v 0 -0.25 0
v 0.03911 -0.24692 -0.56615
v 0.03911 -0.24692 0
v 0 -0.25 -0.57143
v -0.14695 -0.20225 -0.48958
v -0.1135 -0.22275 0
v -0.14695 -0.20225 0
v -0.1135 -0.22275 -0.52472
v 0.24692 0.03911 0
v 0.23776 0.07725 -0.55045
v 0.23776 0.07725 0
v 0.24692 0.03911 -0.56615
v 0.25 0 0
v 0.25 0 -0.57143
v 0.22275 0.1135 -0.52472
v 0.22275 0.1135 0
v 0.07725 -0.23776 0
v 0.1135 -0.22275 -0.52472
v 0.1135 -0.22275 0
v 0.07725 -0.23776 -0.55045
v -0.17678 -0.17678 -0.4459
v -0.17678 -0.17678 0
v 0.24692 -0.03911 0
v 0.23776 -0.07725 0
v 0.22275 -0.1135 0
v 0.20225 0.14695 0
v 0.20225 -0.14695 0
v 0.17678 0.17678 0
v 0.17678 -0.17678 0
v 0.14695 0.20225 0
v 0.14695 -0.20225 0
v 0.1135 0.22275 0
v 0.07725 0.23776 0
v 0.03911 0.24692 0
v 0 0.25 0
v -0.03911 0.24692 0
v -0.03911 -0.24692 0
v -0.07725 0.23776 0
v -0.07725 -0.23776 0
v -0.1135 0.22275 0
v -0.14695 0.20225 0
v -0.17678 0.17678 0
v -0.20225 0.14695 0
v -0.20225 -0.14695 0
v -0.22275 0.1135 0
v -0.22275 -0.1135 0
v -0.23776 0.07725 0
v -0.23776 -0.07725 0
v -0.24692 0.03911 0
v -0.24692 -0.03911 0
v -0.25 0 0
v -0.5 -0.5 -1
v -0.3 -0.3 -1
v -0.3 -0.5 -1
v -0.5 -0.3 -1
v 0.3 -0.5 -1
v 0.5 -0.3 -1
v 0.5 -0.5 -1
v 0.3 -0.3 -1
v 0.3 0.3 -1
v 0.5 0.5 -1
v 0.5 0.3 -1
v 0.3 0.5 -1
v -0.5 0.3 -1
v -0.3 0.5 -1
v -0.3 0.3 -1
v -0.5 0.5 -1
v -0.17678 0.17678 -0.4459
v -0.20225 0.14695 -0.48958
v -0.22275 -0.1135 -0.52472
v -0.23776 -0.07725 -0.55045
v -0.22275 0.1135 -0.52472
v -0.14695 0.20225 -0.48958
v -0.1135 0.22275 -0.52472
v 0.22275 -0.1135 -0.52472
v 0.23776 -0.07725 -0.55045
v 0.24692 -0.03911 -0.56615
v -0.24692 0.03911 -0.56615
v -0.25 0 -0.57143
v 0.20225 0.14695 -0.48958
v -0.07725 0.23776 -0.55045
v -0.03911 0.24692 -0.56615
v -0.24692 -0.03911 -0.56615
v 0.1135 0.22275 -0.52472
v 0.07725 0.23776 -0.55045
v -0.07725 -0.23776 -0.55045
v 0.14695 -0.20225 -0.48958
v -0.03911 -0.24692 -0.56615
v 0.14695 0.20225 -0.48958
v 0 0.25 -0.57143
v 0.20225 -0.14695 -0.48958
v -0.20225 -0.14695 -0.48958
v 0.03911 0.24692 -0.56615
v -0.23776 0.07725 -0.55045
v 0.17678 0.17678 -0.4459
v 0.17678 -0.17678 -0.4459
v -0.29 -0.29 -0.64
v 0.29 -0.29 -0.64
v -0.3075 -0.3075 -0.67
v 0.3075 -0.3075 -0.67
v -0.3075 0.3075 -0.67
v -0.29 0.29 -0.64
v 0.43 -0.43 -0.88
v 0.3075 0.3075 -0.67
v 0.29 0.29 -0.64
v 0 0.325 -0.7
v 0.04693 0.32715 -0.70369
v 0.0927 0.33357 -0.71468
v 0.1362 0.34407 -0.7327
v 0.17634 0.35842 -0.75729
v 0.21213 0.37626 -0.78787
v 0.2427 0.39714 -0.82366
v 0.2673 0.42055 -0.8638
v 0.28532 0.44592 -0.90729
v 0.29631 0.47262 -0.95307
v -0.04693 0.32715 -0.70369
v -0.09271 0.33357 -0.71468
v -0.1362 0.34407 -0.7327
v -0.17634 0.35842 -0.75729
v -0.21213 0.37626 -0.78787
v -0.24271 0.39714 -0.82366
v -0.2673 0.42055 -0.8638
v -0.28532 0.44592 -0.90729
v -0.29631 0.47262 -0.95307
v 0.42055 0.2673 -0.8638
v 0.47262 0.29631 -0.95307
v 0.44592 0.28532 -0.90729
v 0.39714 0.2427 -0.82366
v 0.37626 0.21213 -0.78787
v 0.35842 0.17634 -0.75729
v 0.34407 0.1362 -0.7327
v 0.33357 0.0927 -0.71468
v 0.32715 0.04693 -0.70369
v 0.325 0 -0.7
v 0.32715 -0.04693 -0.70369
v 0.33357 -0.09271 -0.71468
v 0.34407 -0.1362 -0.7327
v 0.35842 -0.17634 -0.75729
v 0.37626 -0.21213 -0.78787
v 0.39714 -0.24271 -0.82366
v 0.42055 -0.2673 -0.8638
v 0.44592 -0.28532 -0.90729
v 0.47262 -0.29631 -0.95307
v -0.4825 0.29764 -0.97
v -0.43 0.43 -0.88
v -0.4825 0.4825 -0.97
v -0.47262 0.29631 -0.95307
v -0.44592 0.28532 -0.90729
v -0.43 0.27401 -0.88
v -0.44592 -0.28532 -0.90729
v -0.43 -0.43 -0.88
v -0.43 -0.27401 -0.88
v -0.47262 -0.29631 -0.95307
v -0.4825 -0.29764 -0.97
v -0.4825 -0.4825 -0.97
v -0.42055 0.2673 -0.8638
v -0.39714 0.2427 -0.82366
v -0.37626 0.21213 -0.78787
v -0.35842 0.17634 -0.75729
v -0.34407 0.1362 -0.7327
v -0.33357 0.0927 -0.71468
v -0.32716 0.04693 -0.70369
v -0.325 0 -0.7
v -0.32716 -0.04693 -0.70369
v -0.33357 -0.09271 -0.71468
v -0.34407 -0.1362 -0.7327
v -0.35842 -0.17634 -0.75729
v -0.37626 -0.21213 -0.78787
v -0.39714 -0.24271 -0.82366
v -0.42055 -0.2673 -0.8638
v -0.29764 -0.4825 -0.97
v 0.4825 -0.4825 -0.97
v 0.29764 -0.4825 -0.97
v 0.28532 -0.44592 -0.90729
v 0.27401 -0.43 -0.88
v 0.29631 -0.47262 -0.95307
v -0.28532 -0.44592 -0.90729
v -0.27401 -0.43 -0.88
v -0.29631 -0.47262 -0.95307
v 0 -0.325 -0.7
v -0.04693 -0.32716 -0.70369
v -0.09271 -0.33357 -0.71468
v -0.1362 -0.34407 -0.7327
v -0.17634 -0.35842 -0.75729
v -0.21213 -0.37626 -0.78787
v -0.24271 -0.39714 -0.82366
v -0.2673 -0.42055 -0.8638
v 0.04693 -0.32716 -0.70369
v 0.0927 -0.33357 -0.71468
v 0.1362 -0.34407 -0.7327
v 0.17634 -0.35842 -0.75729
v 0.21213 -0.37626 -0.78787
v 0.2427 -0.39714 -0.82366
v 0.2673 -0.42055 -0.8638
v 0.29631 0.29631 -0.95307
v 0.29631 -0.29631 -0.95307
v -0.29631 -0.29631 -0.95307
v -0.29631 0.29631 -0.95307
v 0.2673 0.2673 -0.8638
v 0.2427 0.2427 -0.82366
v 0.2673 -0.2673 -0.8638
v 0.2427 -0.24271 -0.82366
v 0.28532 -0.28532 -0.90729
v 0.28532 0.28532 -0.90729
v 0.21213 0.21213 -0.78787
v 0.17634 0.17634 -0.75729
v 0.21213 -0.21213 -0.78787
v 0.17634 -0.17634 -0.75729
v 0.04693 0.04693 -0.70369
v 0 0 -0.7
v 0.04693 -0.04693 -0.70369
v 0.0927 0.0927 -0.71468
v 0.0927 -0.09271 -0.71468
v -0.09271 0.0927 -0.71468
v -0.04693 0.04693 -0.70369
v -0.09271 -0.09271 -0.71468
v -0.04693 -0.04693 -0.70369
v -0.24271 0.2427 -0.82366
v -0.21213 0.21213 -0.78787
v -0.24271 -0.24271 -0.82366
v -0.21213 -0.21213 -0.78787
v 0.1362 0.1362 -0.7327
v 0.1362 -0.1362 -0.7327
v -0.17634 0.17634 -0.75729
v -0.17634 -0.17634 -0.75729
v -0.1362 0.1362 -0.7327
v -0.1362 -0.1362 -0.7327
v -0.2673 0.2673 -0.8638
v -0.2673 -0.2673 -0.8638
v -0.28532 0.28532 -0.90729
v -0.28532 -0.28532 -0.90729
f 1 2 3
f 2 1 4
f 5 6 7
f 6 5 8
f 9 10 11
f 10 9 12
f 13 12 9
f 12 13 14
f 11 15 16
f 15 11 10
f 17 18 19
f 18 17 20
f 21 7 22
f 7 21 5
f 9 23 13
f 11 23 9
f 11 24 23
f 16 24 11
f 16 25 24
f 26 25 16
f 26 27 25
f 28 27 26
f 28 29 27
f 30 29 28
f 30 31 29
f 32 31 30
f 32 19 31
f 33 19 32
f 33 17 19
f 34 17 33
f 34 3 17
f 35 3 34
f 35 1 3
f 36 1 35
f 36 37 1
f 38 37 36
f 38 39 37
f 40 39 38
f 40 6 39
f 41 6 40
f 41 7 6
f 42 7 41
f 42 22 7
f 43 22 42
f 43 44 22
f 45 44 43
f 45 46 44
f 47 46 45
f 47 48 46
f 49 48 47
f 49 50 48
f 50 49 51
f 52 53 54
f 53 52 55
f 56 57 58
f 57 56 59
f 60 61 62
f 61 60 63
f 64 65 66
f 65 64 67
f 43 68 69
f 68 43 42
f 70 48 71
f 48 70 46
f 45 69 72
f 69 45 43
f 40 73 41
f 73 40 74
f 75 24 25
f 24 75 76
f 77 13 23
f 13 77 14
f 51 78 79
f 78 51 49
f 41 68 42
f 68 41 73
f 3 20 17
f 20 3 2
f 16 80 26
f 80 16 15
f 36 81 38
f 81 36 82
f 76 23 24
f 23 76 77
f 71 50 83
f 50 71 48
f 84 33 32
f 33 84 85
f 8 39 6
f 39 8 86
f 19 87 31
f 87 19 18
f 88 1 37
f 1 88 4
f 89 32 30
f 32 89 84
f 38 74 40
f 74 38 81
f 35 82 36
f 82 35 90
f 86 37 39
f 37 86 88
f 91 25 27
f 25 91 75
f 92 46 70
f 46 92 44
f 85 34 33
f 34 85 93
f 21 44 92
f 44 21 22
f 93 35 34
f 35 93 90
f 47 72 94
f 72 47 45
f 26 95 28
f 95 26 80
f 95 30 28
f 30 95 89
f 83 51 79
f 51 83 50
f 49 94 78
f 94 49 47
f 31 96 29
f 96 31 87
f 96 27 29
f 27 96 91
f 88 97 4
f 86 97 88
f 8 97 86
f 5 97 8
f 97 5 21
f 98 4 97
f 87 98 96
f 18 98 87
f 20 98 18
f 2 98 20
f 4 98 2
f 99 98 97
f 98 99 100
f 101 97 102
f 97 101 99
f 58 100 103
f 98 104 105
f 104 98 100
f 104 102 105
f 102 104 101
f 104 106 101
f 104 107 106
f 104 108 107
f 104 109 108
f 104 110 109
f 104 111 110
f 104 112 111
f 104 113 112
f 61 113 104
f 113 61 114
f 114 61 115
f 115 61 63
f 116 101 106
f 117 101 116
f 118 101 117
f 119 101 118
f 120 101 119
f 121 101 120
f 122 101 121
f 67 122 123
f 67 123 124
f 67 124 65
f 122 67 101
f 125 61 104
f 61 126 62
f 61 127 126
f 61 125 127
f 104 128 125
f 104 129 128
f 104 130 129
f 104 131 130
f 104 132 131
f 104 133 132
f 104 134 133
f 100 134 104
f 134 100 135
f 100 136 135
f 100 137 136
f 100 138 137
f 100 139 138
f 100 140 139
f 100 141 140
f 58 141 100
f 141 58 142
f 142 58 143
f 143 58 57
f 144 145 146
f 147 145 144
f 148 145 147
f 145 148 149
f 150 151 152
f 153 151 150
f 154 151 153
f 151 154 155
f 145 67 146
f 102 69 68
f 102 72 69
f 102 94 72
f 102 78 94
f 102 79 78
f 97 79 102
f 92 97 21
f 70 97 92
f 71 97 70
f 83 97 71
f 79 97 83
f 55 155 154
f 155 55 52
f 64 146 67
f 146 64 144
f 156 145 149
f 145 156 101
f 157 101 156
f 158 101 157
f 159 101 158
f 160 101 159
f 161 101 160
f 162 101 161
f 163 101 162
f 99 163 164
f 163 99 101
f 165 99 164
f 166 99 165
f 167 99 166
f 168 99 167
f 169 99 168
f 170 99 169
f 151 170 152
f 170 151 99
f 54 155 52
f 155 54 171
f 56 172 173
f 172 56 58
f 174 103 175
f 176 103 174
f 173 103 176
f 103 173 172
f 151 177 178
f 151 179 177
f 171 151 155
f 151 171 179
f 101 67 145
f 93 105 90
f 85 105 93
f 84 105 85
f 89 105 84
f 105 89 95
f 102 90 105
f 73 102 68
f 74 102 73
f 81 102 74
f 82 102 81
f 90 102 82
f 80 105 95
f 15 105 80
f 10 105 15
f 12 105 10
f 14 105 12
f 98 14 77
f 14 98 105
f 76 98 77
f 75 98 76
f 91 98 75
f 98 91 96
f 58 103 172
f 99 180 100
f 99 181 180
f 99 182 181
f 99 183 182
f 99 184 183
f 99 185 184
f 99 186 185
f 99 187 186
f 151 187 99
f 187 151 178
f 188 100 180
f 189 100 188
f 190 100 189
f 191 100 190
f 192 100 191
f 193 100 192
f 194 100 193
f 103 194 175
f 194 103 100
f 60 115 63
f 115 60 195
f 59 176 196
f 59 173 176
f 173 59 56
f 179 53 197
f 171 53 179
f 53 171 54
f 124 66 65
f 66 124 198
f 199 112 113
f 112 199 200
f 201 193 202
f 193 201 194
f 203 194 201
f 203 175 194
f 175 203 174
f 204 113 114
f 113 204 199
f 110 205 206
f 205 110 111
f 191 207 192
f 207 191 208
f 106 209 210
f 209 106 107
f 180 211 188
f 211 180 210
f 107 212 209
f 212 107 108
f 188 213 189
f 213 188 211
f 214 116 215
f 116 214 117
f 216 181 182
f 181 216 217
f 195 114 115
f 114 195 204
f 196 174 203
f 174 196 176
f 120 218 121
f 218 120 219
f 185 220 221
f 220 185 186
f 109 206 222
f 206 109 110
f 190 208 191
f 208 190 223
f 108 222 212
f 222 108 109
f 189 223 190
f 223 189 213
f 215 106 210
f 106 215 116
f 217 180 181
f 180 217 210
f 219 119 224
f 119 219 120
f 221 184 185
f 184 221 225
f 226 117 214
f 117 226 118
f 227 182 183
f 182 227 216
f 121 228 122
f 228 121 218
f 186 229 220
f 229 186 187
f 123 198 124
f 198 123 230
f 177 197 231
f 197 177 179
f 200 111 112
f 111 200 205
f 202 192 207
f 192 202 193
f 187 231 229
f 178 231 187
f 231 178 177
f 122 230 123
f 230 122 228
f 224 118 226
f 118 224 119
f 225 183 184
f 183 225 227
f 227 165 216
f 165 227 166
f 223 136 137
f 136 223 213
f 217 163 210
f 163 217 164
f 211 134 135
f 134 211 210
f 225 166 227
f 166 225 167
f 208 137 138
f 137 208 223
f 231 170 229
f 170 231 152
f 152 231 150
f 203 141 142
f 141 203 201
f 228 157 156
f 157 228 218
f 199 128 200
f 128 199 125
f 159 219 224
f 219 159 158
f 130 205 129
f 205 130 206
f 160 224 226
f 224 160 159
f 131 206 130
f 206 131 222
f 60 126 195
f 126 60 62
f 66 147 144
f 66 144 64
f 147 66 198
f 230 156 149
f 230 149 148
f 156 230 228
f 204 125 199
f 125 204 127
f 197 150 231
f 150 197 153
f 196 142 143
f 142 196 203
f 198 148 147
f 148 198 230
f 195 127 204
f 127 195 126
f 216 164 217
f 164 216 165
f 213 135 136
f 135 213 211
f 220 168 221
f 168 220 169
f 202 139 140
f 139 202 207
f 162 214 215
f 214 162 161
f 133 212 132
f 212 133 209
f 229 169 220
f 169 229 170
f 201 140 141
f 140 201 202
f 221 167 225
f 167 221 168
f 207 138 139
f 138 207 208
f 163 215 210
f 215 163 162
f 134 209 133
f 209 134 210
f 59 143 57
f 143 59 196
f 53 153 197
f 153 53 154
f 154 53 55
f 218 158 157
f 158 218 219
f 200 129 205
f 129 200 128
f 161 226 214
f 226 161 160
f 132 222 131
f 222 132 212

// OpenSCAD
//----------------------------------------------
// Eiffel Support 
// Size must be 1x1x1 
//----------------------------------------------
$fn=40;

translate([-0.5,-0.5,-0.5]) 
difference(){
    union() {
        translate([0.5,0.5,0.0]) cylinder(h=1, r1=0.25, r2=0.25, center = true);
        translate([0.5,0.5,-0.5]) linear_extrude(height=0.6, scale=[0.3,0.3], slices=20, twist=0)
     square(1,center = true);
    }
    translate([0.5,0.5,-0.5]) rotate([90,0,0.0]) cylinder(h=1, r1=0.3, r2=0.3, center = true);
    translate([0.5,0.5,-0.5]) rotate([0,90,0.0]) cylinder(h=1, r1=0.3, r2=0.3, center = true);
}
